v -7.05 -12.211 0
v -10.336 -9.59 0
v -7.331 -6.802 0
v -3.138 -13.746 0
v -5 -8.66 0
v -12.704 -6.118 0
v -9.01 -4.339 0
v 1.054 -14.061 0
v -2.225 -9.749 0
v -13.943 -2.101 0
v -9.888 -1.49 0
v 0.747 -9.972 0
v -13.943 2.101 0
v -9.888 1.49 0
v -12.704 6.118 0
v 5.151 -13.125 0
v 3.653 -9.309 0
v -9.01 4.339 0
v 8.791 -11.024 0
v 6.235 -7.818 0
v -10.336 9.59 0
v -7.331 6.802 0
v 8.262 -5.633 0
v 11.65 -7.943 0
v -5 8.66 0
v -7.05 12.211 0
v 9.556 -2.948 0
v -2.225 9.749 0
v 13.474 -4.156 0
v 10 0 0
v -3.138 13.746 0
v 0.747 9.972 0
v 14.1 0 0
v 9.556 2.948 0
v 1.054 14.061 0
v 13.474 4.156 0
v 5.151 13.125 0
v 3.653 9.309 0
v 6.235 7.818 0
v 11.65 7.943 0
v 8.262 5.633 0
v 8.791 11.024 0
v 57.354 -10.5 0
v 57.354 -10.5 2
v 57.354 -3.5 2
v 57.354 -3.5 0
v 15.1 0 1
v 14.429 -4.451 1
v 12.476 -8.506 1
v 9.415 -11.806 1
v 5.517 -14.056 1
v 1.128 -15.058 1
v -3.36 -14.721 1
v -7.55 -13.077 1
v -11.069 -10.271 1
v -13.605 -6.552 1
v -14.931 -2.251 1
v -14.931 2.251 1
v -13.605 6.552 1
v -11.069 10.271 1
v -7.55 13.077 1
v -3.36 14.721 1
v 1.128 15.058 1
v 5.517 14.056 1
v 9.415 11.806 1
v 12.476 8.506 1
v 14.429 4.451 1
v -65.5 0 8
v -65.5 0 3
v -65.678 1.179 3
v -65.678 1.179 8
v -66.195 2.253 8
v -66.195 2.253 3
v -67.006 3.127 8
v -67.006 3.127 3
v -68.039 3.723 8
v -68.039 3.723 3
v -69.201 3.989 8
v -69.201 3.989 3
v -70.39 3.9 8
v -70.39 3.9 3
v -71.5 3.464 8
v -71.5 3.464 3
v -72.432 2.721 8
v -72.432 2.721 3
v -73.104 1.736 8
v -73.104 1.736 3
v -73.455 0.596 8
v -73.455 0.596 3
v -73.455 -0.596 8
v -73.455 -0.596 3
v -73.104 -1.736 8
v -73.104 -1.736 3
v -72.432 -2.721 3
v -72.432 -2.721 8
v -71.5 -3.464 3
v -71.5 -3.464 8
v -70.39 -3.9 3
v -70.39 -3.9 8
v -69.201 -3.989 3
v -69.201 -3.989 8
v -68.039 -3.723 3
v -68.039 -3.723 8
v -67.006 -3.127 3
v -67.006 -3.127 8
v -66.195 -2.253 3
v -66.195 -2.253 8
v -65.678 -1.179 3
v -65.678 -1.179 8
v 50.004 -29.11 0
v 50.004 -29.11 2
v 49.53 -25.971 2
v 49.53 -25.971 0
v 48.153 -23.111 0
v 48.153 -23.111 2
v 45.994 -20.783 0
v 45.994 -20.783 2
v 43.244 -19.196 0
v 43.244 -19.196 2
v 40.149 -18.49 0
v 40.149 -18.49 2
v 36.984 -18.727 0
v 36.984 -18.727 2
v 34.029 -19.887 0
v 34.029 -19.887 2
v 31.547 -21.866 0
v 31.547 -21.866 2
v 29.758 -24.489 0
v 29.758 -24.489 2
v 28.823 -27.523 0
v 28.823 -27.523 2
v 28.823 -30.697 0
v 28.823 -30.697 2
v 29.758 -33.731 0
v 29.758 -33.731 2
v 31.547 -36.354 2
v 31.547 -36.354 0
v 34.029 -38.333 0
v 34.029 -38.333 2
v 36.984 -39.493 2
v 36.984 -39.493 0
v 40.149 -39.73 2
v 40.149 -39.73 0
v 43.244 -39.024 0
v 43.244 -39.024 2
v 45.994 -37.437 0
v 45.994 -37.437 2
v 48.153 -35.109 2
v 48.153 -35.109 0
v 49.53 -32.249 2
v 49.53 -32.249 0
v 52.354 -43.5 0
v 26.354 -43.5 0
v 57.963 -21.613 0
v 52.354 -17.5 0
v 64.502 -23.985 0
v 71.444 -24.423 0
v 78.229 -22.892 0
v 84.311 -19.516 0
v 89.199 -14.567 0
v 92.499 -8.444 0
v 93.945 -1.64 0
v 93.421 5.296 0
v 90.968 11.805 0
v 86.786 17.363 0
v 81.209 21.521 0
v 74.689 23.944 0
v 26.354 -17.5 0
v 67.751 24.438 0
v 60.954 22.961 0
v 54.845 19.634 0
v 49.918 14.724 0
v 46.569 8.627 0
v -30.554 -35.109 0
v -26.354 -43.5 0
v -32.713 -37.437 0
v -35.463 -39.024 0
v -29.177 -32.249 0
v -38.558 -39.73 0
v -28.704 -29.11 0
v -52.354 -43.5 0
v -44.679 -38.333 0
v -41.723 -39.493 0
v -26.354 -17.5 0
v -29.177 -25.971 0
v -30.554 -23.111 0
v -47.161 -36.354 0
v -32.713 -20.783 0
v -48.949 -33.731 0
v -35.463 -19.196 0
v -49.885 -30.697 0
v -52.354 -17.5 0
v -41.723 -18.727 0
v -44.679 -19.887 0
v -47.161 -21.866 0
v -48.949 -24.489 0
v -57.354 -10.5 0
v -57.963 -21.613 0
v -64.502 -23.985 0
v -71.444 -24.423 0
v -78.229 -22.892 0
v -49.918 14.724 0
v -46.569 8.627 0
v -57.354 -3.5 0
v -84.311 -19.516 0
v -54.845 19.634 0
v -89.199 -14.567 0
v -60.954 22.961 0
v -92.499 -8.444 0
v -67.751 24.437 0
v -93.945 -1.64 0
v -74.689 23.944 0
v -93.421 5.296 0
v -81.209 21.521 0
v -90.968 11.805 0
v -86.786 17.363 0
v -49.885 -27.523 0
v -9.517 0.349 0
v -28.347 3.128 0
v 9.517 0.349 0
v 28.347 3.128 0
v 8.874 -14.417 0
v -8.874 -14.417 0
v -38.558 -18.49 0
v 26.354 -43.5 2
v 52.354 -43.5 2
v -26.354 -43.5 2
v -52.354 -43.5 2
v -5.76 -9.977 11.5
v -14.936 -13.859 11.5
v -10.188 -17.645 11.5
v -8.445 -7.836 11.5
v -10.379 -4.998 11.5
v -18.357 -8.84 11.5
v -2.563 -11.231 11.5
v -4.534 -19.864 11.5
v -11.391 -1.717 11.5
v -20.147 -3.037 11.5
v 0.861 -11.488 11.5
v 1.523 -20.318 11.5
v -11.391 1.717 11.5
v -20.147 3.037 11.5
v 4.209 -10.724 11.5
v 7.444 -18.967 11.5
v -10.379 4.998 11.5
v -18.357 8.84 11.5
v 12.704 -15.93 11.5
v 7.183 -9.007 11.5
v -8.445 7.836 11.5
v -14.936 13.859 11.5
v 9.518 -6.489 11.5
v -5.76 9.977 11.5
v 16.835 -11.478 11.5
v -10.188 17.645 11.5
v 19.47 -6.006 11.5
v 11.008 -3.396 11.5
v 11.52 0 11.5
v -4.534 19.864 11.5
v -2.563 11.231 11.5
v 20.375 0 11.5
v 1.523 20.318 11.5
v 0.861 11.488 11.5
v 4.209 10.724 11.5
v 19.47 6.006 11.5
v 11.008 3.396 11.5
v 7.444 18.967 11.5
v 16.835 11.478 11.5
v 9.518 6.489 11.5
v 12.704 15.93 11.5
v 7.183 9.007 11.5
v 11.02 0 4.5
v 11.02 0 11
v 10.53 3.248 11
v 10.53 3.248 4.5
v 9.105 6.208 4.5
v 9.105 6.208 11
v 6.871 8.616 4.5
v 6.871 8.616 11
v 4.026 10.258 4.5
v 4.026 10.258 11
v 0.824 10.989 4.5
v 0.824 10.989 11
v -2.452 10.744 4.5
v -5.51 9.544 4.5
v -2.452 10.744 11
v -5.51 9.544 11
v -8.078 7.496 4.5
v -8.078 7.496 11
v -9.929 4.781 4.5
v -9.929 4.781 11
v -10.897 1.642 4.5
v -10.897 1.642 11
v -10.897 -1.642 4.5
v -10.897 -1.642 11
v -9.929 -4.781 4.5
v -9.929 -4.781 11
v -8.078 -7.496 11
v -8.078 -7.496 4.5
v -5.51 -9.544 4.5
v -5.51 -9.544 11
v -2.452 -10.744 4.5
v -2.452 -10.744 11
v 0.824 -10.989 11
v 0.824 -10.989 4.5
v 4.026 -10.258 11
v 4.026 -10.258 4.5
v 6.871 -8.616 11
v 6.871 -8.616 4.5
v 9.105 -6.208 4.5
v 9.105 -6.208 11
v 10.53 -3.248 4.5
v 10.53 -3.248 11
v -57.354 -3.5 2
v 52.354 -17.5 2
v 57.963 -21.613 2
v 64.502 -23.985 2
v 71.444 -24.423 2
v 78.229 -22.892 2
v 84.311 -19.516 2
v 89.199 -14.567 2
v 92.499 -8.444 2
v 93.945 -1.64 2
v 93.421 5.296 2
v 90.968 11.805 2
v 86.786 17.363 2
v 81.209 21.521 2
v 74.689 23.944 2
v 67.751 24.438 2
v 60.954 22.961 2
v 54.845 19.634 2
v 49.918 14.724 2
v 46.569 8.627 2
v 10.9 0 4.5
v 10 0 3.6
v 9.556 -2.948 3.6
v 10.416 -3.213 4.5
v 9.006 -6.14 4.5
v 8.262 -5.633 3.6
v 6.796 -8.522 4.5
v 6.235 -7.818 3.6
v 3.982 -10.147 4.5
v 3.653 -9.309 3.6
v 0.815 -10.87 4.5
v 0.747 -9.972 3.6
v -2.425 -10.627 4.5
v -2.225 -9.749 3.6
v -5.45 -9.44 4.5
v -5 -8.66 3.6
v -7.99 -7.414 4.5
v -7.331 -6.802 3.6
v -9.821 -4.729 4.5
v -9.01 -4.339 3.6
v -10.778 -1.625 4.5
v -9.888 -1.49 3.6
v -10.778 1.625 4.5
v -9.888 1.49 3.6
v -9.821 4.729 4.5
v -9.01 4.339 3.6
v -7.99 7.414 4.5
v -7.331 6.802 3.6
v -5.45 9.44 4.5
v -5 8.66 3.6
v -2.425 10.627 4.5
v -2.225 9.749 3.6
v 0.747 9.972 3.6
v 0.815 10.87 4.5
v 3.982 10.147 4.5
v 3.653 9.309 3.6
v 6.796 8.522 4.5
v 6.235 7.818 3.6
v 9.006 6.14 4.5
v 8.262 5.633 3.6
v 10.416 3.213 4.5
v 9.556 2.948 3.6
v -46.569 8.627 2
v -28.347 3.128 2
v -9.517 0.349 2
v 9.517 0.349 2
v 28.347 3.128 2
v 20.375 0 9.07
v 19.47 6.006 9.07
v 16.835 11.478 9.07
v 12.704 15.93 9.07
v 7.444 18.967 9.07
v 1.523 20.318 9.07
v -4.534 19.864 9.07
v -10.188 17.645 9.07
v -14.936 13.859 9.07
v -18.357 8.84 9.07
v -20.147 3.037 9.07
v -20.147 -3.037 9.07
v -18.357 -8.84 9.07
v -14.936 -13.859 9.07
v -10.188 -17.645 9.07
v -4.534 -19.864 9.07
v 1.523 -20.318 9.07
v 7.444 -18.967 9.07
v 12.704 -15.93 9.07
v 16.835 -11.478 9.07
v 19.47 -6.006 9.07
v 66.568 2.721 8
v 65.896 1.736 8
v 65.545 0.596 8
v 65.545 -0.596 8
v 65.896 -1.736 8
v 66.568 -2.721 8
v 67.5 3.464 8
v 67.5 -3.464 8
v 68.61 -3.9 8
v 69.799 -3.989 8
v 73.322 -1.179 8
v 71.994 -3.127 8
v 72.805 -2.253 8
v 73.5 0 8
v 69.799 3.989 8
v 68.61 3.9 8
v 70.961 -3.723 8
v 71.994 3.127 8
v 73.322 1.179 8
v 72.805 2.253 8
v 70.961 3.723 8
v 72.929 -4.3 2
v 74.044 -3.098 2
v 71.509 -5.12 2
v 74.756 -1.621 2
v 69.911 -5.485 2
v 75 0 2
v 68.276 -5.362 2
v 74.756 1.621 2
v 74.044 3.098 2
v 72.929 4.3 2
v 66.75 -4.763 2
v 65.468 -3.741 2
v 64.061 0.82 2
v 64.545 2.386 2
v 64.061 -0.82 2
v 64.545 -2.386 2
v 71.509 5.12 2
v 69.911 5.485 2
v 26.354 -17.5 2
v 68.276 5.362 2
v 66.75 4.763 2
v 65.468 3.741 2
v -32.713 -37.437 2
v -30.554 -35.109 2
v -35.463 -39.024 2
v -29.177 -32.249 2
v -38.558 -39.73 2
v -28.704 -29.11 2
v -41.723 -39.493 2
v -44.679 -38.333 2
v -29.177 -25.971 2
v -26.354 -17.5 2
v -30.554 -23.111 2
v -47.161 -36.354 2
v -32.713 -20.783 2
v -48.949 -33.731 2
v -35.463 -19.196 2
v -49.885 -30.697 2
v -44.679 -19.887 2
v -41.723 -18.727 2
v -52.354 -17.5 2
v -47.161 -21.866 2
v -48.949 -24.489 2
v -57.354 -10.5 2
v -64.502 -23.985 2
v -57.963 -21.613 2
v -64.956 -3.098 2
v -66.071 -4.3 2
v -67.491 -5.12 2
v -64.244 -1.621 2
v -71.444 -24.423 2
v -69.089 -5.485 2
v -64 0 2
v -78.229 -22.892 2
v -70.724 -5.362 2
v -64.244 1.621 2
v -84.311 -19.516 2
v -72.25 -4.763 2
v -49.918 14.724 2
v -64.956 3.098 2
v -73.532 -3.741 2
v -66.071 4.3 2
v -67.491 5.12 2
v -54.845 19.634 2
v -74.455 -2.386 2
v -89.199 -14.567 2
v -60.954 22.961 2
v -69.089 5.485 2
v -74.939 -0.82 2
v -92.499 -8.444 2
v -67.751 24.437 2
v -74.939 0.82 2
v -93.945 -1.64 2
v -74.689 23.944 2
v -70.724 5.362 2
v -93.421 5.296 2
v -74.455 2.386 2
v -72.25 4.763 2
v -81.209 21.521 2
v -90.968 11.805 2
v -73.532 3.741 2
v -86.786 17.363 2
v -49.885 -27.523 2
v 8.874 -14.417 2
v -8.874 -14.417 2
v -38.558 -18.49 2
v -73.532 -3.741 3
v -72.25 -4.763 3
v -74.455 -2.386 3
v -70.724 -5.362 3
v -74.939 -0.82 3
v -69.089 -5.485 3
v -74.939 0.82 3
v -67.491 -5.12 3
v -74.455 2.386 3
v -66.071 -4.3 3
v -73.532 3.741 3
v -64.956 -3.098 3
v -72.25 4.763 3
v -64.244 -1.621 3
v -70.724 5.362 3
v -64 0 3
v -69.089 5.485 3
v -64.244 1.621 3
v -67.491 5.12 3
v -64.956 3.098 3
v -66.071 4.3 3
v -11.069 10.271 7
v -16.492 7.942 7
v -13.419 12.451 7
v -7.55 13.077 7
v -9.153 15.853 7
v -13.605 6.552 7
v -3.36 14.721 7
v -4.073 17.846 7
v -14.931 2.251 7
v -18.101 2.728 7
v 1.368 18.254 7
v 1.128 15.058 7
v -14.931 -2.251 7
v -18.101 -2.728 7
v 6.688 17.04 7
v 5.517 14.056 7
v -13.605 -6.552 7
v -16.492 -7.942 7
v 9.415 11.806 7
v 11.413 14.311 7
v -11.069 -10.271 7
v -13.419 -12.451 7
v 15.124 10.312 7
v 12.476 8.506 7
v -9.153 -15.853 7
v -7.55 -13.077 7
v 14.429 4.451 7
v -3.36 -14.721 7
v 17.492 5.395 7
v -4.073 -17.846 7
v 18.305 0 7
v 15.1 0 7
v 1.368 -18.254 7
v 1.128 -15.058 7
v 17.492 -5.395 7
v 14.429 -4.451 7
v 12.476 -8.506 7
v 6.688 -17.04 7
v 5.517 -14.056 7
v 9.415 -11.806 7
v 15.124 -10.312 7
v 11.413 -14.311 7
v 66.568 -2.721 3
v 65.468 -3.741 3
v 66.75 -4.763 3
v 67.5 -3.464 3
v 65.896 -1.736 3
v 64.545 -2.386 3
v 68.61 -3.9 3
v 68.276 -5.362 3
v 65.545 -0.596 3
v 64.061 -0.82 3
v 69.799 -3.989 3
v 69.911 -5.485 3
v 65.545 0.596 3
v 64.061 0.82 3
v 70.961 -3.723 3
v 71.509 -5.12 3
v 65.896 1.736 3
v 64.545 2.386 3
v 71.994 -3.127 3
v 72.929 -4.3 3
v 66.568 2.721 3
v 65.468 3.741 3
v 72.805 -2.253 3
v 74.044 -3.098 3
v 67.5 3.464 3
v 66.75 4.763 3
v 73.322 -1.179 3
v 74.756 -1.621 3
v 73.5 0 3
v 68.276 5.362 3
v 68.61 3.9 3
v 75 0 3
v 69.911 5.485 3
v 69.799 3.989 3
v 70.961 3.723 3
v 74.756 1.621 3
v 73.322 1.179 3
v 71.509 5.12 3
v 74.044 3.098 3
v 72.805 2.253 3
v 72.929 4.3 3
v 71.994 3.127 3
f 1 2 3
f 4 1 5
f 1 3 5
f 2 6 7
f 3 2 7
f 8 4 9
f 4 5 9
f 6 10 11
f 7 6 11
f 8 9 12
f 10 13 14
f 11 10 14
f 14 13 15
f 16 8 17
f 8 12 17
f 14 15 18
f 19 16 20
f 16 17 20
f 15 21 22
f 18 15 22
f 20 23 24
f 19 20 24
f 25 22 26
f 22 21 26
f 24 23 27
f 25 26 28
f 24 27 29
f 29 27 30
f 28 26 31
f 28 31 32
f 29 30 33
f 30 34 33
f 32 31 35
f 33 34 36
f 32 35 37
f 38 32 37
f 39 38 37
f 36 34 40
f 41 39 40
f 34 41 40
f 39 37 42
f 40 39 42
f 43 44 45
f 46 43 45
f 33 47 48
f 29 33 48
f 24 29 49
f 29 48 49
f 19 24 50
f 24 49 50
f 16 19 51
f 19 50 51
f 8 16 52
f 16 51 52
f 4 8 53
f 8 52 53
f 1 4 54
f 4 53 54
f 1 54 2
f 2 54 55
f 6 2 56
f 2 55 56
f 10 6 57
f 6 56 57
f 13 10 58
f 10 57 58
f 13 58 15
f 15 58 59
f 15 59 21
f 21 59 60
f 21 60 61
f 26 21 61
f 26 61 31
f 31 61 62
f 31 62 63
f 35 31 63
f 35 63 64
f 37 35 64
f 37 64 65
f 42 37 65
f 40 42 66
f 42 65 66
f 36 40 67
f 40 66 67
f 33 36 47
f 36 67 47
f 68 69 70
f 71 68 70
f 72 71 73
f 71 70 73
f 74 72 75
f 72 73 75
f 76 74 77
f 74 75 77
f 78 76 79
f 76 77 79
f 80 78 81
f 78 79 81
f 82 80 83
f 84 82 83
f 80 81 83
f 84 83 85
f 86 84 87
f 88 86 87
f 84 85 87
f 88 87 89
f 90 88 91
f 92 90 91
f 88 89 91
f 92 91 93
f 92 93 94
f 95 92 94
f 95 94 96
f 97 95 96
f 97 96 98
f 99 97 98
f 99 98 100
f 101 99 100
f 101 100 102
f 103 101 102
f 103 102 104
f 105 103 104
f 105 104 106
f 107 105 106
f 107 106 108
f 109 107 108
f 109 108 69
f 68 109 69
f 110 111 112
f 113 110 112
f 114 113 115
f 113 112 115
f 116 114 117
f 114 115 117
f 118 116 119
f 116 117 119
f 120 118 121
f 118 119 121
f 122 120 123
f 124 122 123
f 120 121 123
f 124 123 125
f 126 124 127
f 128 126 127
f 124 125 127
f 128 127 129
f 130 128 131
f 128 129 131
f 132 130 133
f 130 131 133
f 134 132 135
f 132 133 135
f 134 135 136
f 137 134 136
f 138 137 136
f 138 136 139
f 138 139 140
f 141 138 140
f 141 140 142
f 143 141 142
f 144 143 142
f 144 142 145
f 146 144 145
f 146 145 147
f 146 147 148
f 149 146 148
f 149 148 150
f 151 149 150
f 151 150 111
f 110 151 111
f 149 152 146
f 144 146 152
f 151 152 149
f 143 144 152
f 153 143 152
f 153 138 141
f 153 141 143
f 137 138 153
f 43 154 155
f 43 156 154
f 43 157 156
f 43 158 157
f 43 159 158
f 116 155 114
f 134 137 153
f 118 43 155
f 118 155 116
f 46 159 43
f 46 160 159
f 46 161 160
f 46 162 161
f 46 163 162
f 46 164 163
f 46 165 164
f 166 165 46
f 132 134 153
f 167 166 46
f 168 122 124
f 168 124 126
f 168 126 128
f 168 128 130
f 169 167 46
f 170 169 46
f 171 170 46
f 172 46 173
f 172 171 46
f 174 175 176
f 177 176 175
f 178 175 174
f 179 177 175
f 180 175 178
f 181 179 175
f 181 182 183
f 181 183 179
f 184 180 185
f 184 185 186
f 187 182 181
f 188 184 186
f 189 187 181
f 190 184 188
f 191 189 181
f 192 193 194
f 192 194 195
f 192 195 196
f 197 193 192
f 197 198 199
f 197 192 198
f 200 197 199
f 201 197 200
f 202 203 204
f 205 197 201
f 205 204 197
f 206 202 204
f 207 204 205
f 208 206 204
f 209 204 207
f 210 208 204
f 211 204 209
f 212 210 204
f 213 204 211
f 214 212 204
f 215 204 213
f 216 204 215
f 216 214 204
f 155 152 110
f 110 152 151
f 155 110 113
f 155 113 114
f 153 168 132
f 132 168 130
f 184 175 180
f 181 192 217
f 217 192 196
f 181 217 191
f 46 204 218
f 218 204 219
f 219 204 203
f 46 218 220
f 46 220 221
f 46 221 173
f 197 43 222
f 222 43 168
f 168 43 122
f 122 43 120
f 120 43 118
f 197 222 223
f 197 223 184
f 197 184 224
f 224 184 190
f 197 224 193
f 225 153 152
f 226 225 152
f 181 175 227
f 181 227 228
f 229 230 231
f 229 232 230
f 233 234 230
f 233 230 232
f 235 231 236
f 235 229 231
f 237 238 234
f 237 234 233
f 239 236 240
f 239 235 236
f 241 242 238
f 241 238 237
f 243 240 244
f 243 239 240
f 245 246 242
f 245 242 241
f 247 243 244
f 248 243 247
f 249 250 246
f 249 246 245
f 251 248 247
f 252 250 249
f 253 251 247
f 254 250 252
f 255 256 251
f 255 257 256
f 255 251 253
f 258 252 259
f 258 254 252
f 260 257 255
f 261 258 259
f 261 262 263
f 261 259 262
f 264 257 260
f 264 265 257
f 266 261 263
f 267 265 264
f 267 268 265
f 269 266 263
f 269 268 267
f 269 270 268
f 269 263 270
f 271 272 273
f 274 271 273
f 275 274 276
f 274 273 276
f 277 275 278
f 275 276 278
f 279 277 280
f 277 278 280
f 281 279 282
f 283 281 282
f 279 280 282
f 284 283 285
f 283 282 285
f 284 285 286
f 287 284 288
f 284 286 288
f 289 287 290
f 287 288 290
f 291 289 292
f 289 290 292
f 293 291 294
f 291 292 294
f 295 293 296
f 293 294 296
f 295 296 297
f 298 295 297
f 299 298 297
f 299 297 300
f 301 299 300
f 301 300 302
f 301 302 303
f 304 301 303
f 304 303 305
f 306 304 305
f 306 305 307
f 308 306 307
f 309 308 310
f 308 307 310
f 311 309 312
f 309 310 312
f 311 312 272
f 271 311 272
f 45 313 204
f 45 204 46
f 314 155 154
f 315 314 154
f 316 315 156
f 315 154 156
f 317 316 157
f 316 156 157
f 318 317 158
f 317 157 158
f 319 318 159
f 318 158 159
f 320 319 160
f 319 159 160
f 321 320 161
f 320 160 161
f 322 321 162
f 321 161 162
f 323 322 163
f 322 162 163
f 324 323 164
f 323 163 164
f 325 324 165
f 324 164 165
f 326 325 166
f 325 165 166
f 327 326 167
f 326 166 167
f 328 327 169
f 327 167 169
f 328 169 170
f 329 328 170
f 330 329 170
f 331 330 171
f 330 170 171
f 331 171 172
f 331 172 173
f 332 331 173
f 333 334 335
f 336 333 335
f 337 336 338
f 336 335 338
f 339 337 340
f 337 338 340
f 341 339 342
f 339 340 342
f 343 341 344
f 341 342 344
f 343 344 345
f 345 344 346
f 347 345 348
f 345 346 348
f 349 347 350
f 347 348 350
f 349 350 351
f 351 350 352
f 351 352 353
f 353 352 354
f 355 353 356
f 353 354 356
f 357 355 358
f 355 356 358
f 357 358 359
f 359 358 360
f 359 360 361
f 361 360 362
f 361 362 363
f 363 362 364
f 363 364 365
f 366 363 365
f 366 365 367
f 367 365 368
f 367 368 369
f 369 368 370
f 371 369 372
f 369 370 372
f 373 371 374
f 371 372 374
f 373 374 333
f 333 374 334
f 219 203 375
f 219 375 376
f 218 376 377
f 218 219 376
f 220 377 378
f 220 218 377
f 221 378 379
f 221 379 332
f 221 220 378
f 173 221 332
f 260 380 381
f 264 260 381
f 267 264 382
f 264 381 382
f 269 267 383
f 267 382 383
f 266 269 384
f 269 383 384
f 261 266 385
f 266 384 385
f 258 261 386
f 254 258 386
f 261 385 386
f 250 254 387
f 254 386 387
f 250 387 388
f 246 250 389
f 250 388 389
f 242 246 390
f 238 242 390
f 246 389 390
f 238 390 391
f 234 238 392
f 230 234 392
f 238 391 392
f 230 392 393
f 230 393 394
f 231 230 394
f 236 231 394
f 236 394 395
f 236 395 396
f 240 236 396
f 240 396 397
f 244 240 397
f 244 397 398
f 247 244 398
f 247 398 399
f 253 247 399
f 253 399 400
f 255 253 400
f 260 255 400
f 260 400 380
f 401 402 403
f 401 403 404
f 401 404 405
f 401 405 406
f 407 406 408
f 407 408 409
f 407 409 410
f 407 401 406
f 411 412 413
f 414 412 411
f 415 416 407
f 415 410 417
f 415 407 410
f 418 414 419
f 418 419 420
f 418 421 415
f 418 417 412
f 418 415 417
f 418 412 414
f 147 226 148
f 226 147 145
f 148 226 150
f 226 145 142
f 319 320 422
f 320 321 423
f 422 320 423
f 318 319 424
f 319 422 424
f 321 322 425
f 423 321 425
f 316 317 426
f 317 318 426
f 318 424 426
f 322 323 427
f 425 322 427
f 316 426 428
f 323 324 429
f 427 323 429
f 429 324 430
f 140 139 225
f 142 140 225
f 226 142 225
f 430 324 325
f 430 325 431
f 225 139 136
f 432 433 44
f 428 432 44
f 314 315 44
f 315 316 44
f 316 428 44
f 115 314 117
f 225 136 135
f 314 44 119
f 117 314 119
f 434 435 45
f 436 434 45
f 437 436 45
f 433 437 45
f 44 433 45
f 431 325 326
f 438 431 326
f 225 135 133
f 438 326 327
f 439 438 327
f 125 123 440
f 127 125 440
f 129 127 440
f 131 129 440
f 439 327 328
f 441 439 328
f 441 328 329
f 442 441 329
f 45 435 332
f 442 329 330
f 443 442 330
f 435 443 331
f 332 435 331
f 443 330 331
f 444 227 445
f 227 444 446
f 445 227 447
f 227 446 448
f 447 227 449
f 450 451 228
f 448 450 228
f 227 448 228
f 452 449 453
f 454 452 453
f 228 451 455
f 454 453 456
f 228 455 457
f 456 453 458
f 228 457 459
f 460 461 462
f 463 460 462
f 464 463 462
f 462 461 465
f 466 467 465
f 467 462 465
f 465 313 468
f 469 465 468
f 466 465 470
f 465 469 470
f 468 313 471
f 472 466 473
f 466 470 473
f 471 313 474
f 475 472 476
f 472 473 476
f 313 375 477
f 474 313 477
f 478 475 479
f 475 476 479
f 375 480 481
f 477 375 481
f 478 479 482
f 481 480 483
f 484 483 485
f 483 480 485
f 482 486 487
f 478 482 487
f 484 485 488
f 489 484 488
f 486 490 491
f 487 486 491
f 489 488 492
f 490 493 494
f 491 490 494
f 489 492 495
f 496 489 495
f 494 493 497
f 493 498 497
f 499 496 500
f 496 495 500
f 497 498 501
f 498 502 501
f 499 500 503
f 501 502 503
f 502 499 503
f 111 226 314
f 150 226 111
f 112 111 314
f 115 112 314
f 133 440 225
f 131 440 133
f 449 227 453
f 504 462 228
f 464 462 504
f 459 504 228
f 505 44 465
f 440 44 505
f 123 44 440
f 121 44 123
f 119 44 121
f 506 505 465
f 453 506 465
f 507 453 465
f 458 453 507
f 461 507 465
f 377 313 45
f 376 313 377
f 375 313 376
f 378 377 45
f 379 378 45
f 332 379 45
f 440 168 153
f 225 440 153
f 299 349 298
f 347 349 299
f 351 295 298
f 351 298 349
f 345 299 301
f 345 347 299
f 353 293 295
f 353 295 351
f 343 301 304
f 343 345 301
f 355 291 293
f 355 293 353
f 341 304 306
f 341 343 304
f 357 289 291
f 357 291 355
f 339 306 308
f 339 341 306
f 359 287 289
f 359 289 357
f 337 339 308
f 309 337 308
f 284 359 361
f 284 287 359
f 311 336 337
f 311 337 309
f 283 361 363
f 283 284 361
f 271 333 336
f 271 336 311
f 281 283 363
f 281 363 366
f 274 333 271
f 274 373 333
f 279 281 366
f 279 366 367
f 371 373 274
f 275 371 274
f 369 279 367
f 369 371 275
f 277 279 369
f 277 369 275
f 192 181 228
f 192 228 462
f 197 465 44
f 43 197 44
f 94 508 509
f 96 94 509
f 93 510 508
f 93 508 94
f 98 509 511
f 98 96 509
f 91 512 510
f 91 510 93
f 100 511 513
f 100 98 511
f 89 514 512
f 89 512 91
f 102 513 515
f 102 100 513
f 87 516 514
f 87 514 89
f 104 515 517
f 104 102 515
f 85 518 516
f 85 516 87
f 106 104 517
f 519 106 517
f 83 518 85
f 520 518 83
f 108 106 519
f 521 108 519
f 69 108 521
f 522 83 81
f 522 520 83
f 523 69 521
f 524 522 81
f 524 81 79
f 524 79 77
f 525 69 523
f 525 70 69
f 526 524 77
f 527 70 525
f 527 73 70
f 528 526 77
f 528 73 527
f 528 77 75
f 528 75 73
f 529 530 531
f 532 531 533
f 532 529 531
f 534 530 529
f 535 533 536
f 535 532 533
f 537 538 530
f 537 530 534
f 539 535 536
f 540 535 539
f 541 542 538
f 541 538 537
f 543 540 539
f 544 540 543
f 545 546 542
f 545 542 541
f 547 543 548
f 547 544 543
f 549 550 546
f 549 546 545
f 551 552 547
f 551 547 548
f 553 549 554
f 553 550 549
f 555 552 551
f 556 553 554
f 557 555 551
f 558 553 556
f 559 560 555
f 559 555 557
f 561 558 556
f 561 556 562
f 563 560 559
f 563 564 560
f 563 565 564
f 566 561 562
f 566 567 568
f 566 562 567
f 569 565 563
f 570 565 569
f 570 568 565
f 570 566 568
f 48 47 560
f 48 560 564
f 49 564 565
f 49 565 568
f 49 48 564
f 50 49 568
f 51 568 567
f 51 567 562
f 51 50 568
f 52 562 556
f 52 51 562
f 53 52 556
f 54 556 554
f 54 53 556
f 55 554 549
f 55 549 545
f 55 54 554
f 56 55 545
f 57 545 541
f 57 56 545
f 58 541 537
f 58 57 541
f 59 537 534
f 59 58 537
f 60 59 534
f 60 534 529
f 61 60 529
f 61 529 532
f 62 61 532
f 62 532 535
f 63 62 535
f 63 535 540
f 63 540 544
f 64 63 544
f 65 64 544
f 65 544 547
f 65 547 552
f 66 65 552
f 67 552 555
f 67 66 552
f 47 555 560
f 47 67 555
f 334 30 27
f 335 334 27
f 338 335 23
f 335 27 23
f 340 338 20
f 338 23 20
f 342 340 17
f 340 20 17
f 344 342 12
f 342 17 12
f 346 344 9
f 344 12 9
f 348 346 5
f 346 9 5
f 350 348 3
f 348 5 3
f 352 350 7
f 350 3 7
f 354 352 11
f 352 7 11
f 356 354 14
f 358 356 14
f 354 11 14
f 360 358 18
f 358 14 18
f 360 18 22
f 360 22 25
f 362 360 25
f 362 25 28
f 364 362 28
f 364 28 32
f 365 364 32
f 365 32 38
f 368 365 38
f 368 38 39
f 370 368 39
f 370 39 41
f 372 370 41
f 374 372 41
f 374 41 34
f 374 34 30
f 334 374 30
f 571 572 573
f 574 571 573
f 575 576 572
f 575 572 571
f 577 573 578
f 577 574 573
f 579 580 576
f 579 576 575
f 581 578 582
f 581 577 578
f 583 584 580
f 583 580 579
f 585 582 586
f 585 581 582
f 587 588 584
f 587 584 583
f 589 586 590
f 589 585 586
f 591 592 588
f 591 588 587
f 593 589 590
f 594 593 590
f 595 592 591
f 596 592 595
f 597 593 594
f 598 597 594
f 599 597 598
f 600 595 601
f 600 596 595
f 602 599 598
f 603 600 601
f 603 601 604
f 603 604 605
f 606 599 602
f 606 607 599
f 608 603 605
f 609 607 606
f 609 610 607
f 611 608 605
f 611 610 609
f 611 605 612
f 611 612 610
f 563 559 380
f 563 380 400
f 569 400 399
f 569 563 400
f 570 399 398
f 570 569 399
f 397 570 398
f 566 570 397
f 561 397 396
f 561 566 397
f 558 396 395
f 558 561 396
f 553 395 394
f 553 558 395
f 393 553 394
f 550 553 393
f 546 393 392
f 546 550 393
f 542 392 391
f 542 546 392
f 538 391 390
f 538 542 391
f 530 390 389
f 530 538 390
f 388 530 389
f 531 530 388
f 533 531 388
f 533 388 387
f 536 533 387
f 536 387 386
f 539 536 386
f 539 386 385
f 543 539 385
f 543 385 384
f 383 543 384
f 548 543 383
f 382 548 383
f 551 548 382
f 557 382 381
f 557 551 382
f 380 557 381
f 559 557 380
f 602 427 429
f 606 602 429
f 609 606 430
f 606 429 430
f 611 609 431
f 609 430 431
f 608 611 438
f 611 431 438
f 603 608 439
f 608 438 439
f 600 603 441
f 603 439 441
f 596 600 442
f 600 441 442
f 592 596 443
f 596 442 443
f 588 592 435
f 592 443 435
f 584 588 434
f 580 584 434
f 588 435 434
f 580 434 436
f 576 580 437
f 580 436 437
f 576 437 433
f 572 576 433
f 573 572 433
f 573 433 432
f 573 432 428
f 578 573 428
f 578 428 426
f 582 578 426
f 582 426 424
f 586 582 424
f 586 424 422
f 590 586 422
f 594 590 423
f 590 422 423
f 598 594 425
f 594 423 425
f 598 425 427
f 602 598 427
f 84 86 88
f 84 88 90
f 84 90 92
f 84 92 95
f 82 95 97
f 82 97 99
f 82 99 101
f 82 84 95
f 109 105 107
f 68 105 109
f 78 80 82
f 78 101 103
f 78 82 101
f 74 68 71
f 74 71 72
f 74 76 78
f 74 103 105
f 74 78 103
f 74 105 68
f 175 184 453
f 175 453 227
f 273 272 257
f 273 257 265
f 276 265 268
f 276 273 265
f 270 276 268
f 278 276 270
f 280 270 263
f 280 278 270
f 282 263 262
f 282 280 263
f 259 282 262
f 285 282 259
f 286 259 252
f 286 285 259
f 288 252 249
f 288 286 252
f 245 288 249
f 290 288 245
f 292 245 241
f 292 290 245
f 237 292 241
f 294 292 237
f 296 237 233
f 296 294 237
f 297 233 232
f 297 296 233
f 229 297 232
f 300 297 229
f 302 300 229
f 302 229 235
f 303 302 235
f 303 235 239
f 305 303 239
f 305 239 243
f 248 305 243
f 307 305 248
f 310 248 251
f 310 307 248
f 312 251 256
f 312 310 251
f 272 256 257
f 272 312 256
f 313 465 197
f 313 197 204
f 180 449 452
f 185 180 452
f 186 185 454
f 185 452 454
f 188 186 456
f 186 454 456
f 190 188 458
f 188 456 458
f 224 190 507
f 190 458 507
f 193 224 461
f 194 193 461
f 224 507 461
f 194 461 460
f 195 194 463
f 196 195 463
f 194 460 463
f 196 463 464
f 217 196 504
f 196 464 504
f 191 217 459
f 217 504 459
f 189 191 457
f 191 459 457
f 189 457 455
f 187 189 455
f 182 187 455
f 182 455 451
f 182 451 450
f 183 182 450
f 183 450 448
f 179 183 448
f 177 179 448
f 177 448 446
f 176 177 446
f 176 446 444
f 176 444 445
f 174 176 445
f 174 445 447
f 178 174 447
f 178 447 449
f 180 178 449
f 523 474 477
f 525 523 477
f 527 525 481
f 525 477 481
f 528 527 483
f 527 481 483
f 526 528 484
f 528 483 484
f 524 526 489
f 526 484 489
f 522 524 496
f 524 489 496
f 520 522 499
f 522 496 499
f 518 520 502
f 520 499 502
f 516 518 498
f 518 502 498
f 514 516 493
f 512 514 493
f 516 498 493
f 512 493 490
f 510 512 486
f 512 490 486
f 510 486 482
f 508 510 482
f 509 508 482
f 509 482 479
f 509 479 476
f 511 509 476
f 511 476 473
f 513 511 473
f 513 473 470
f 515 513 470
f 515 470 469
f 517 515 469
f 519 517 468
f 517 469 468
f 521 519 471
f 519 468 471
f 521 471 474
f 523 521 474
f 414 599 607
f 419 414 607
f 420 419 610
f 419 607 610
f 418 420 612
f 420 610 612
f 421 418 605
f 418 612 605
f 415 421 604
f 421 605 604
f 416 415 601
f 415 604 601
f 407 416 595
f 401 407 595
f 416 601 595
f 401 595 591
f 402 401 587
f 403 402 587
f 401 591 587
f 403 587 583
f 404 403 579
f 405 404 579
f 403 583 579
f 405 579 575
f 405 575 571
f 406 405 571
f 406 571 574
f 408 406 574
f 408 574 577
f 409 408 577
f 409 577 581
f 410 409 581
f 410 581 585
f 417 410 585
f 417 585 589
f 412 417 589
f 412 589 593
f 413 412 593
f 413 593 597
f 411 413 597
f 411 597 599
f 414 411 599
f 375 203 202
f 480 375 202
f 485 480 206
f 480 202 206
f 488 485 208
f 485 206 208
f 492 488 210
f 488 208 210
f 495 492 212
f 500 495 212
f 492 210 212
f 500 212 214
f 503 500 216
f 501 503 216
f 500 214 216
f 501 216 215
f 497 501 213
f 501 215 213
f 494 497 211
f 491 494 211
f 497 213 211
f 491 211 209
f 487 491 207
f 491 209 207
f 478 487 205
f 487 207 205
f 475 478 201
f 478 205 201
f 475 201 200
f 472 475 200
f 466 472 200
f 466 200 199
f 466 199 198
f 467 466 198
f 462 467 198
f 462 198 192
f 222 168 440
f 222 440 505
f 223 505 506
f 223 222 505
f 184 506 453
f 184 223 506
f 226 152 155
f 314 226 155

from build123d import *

# Parameters (mm, degrees)
SKETCH_R        = 20.375
PAD_DEPTH       = 11.5
SKETCH001_R     = 11.02
POCKET_DEPTH    = 7
SKETCH002_R     = 22.557979
SKETCH002_R_2   = 15.1
POCKET001_DEPTH = 7
SKETCH003_R     = 10
POCKET002_DEPTH = 11.501
CHAMFER_SIZE    = 2.07
CHAMFER001_SIZE = 0.5
CHAMFER002_SIZE = 0.9
CHAMFER003_SIZE = 1
PAD001_DEPTH    = 2
SKETCH005_R     = 10.65
POCKET003_DEPTH = 2.001
SKETCH006_R     = 5.5
PAD002_DEPTH    = 1
SKETCH007_R     = 4
PAD003_DEPTH    = 6
SKETCH008_W     = 114.707144
SKETCH008_H     = 7
POCKET004_DEPTH = 2.001


with BuildPart() as body:
    # Sketch → Pad (new body)
    with BuildSketch(Plane.XY):
        Circle(SKETCH_R)
    extrude(amount=PAD_DEPTH)

    # Sketch001 (on Face3 of Pad) → Pocket (cut)
    with BuildSketch(Plane.XY.offset(11.5)):
        Circle(SKETCH001_R)
    extrude(amount=-POCKET_DEPTH, mode=Mode.SUBTRACT)

    # Sketch002 (on Face2 of Pocket) → Pocket001 (cut)
    with BuildSketch(Plane(origin=(0, 0, 0), x_dir=(1, 0, 0), z_dir=(0, 0, -1))):
        Circle(SKETCH002_R)
        Circle(SKETCH002_R_2, mode=Mode.SUBTRACT)
    extrude(amount=-POCKET001_DEPTH, mode=Mode.SUBTRACT)

    # Sketch003 → Pocket002 (cut, through all)
    with BuildSketch(Plane(origin=(0, 0, 0), x_dir=(1, 0, 0), z_dir=(0, 0, -1))):
        Circle(SKETCH003_R)
    extrude(amount=-POCKET002_DEPTH, mode=Mode.SUBTRACT)

    # Chamfer
    chamfer_edges = [body.edges().sort_by_distance(p)[0] for p in [
        (-20.375, 0, 7),
    ]]
    chamfer(chamfer_edges, length=CHAMFER_SIZE)

    # Chamfer001
    chamfer001_edges = [body.edges().sort_by_distance(p)[0] for p in [
        (-11.02, 0, 11.5),
    ]]
    chamfer(chamfer001_edges, length=CHAMFER001_SIZE)

    # Chamfer002
    chamfer002_edges = [body.edges().sort_by_distance(p)[0] for p in [
        (-10, 0, 4.5),
    ]]
    chamfer(chamfer002_edges, length=CHAMFER002_SIZE)

    # Chamfer003
    chamfer003_edges = [body.edges().sort_by_distance(p)[0] for p in [
        (-15.1, 0, 0),
    ]]
    chamfer(chamfer003_edges, length=CHAMFER003_SIZE)


with BuildPart() as body001:
    # Sketch004 → Pad001 (new body)
    with BuildSketch(Plane.XY):
        with BuildLine():
            ThreePointArc((-46.569269, 8.627374), (3e-05, 0), (46.56931, 8.627482))
            ThreePointArc((52.353572, -17.5), (93.420811, 5.295736), (46.56931, 8.627482))
            Line((52.353572, -43.5), (52.353572, -17.5))
            Line((26.353572, -43.5), (52.353572, -43.5))
            Line((26.353572, -17.5), (26.353572, -43.5))
            ThreePointArc((26.353572, -17.5), (0, -14.029662), (-26.353572, -17.5))
            Line((-26.353572, -17.5), (-26.353572, -43.5))
            Line((-26.353572, -43.5), (-52.353572, -43.5))
            Line((-52.353572, -43.5), (-52.353572, -17.5))
            ThreePointArc((-46.569269, 8.627374), (-93.420798, 5.295792), (-52.353572, -17.5))
        make_face()
    extrude(amount=PAD001_DEPTH)

    # Sketch005 (on Face12 of Pad001) → Pocket003 (cut, through all)
    with BuildSketch(Plane.XY.offset(2)):
        with Locations((-39.353572, -29.11)):
            Circle(SKETCH005_R)
        with Locations((39.353572, -29.11)):
            Circle(SKETCH005_R)
    extrude(amount=-POCKET003_DEPTH, mode=Mode.SUBTRACT)

    # Sketch006 (on Face5 of Pocket003) → Pad002 (join)
    with BuildSketch(Plane.XY.offset(2)):
        with Locations((-69.5, 0)):
            Circle(SKETCH006_R)
        with Locations((69.5, 0)):
            Circle(SKETCH006_R)
    extrude(amount=PAD002_DEPTH)

    # Sketch007 (on Face5 of Pad002) → Pad003 (join)
    with BuildSketch(Plane.XY.offset(2)):
        with Locations((-69.5, 0)):
            Circle(SKETCH007_R)
        with Locations((69.5, 0)):
            Circle(SKETCH007_R)
    extrude(amount=PAD003_DEPTH)

    # Sketch008 (on Face5 of Pad003) → Pocket004 (cut, through all)
    with BuildSketch(Plane.XY.offset(2)):
        with Locations((0, -7)):
            Rectangle(SKETCH008_W, SKETCH008_H)
    extrude(amount=-POCKET004_DEPTH, mode=Mode.SUBTRACT)


solid = Compound([body.part, body001.part])
